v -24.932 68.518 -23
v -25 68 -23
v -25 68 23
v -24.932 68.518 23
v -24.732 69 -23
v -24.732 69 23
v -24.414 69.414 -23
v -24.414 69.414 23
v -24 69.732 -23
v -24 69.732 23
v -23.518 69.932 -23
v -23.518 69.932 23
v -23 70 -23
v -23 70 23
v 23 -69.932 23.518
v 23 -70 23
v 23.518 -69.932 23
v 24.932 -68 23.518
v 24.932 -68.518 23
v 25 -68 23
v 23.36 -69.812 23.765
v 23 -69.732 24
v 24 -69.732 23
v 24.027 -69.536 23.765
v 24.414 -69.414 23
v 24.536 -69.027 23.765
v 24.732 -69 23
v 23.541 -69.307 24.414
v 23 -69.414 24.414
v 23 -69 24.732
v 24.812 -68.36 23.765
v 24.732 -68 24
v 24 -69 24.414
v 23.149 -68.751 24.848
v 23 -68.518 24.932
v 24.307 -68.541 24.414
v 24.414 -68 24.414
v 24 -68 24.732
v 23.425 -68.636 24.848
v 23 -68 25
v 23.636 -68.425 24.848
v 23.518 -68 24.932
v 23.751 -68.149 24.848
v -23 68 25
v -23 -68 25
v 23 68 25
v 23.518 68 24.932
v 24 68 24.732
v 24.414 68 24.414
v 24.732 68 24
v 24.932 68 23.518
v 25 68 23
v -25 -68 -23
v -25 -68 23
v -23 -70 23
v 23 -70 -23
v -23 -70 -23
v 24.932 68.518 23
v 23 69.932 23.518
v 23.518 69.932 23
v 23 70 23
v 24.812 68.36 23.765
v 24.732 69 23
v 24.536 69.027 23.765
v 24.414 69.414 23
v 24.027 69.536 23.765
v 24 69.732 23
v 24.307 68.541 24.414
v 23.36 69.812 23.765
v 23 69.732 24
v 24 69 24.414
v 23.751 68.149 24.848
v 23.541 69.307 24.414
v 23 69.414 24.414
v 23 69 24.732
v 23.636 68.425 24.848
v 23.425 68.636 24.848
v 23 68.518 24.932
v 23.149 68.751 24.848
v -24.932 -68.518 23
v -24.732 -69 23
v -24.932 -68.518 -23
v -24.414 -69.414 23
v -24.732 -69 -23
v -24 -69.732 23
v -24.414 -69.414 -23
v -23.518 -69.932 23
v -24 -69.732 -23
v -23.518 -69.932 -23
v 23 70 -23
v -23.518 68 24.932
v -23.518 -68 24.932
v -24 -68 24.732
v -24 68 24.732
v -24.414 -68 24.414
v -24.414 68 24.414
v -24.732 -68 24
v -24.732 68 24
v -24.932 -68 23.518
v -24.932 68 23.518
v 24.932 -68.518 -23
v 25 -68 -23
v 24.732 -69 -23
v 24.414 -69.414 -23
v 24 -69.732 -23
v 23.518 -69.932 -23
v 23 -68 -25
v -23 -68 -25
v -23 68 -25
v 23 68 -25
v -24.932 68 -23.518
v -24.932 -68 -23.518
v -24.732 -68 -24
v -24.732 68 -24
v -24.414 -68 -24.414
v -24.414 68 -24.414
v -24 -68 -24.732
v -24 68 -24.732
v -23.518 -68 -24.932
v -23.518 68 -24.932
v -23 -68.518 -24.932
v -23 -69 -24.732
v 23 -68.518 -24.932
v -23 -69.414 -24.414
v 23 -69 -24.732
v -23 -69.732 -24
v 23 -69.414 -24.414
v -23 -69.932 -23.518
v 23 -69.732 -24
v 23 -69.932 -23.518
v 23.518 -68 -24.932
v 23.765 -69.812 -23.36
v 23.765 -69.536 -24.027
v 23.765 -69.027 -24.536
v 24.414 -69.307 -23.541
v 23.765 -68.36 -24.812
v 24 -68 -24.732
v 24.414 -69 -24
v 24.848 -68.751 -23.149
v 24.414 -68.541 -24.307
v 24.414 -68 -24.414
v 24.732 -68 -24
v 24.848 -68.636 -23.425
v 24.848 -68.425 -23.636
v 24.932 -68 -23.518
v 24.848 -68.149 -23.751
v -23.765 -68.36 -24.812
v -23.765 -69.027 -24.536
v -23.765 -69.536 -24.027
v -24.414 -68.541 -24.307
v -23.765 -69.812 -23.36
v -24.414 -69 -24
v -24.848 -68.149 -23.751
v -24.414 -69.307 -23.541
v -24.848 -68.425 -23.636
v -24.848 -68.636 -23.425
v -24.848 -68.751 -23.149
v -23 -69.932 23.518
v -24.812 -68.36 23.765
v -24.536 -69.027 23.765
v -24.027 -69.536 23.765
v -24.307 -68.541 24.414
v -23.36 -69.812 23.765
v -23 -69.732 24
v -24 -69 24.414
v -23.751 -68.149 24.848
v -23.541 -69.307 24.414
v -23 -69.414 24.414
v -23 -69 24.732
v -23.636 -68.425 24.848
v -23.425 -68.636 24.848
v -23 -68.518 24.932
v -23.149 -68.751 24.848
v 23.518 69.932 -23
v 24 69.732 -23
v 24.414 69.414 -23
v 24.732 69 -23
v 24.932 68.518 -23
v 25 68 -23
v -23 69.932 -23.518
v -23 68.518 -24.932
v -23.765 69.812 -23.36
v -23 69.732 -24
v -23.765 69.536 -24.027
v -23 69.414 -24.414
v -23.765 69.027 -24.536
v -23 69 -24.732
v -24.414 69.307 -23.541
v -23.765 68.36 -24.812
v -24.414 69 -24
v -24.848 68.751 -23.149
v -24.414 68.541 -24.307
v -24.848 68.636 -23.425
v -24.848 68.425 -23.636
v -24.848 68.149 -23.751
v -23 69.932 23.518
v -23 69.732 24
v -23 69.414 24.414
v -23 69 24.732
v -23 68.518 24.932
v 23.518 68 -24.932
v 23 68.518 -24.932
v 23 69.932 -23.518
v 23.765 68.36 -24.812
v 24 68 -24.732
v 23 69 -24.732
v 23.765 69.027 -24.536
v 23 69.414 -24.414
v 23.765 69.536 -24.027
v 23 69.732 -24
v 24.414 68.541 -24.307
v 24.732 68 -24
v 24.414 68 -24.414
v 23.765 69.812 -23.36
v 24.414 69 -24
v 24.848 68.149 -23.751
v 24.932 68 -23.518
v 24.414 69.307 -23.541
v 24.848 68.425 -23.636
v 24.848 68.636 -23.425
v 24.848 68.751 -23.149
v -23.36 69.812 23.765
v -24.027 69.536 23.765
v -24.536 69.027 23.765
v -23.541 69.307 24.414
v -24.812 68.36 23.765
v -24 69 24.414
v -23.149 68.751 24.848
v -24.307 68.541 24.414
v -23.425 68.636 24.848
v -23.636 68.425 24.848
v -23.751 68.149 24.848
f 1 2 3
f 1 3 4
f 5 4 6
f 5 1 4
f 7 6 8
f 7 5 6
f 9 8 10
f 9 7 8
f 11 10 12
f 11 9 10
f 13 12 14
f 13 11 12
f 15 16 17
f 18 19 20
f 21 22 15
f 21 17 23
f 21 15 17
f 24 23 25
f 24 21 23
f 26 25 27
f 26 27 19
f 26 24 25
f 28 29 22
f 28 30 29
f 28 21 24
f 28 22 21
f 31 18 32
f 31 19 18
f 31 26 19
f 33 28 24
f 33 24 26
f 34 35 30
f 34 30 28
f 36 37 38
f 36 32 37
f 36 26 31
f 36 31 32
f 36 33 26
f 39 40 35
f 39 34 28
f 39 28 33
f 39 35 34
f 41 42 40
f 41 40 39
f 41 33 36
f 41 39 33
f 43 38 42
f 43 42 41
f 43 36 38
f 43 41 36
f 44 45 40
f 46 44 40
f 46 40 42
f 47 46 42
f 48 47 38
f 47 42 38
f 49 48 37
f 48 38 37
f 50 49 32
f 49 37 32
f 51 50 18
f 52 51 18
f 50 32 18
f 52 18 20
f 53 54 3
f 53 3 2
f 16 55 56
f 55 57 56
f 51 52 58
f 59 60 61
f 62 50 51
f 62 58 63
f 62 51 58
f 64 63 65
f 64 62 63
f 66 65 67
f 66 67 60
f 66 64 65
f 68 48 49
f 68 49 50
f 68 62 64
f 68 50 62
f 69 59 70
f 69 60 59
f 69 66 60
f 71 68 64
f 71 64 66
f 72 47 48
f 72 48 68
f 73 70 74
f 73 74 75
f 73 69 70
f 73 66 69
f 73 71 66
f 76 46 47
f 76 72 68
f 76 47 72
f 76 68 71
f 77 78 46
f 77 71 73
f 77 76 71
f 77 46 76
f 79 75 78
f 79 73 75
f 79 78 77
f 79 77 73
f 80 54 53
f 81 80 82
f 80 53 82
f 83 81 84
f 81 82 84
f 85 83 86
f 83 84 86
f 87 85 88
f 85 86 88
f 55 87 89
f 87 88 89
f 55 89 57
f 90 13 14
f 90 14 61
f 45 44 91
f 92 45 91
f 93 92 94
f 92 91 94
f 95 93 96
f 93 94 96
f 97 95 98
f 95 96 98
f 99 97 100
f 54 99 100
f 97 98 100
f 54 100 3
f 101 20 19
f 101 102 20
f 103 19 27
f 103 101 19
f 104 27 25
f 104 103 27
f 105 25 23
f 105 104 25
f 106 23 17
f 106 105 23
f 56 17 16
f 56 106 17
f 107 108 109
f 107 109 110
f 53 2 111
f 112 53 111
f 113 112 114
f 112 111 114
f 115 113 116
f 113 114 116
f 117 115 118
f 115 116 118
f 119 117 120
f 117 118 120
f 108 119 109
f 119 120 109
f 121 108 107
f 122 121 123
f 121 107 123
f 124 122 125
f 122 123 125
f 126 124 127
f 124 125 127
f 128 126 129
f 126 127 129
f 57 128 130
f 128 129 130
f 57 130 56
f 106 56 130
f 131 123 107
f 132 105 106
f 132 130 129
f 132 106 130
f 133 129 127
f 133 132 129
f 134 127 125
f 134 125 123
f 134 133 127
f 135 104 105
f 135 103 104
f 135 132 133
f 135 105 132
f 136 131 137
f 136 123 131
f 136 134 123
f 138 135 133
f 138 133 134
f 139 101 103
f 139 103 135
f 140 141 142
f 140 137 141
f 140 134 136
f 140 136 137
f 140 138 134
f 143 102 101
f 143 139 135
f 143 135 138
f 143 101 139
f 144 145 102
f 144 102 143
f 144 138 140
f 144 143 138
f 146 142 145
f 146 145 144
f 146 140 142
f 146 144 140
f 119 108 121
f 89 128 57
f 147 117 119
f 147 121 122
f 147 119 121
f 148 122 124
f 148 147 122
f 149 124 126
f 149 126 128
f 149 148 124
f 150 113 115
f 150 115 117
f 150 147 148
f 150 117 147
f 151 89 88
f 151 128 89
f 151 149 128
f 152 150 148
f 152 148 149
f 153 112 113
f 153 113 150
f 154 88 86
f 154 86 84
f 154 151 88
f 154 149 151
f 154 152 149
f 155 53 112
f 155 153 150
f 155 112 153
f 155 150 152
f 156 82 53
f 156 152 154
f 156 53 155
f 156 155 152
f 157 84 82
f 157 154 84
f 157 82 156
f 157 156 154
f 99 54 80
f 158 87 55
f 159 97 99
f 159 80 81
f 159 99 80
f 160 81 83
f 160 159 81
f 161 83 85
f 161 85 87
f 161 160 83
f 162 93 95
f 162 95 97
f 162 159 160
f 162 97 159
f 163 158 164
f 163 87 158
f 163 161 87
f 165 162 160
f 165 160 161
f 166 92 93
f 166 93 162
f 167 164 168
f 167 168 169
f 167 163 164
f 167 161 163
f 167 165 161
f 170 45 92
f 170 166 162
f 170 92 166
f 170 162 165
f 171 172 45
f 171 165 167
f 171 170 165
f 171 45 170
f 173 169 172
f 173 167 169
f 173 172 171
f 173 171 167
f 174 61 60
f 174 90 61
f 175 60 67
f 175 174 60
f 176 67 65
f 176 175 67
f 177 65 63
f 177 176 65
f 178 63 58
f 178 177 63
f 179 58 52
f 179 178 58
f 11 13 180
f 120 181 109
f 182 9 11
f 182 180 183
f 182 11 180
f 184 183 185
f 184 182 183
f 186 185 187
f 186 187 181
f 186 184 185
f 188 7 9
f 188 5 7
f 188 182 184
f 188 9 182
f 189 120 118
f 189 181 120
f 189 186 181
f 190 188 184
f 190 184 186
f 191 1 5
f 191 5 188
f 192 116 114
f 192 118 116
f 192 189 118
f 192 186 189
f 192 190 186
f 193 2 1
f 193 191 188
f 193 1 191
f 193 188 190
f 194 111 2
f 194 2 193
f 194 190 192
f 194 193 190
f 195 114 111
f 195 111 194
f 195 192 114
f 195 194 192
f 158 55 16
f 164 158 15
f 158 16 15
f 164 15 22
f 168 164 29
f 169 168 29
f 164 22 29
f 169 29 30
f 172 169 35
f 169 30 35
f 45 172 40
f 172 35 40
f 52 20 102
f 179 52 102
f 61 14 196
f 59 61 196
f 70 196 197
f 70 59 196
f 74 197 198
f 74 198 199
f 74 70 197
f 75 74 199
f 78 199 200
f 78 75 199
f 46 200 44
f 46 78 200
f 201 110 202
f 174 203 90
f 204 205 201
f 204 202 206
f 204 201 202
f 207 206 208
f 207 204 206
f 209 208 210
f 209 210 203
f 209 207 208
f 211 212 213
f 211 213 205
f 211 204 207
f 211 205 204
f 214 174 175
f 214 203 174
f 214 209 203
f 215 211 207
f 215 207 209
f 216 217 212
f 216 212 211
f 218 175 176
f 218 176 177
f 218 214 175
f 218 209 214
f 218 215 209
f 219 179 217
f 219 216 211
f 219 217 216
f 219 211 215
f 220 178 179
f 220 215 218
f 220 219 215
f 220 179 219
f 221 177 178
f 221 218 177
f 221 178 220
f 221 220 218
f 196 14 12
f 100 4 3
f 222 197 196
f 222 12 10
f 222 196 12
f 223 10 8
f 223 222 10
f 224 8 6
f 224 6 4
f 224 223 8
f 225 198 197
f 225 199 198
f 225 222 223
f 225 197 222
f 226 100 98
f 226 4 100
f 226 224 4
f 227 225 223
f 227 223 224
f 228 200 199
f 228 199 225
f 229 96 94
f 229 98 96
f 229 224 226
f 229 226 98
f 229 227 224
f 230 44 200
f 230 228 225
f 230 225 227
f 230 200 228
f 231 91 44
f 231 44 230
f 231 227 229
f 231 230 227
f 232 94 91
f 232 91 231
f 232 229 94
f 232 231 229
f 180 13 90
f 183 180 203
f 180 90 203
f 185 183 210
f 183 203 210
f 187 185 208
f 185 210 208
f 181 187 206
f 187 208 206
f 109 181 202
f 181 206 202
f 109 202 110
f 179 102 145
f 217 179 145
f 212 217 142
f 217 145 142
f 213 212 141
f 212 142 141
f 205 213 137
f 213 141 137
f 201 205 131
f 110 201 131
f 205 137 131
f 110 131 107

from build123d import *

# Parameters (mm, degrees)
SKETCH1_W           = 50
SKETCH1_H           = 50
BOSS_EXTRUDE1_DEPTH = 70
FILLET1_R           = 2
FILLET2_R           = 2


with BuildPart() as part:
    # Sketch1 → Boss-Extrude1 (new, symmetric)
    with BuildSketch(Plane(origin=(0, 0, 0), x_dir=(1, 0, 0), z_dir=(0, 1, 0))):
        Rectangle(SKETCH1_W, SKETCH1_H)
    extrude(amount=BOSS_EXTRUDE1_DEPTH, both=True)

    # Fillet1
    fillet1_edges = [part.edges().sort_by_distance(p)[0] for p in [
        (-25, 70, 0),
        (0, 70, 25),
        (25, 70, 0),
        (0, -70, 25),
        (-25, -70, 0),
        (0, -70, -25),
        (25, -70, 0),
        (0, 70, -25),
    ]]
    fillet(fillet1_edges, radius=FILLET1_R)

    # Fillet2
    # the kernel refuses this fillet: 2 mm, written as the material it takes off along each edge
    with BuildSketch(Plane(origin=(23, -68, 23), x_dir=(1, 0, 0), z_dir=(0, 0, 1))) as fillet2_piece_1_section:
        Polygon((0, 0), (FILLET2_R, 0), (FILLET2_R, -FILLET2_R), (0, -FILLET2_R), align=None)
    fillet2_piece_1 = extrude(amount=FILLET2_R, mode=Mode.PRIVATE)
    fillet2_piece_1 = fillet2_piece_1 - Plane(origin=(23, -68, 23), x_dir=(-0.7071067811865475, 0.7071067811865475, 0), z_dir=(0, 0, 1)) * Sphere(FILLET2_R, mode=Mode.PRIVATE)
    add(fillet2_piece_1, mode=Mode.SUBTRACT)
    with BuildSketch(Plane(origin=(-23, -68, 23), x_dir=(-1, 0, 0), z_dir=(0, 0, 1))) as fillet2_piece_2_section:
        Polygon((0, 0), (FILLET2_R, 0), (FILLET2_R, FILLET2_R), (0, FILLET2_R), align=None)
    fillet2_piece_2 = extrude(amount=FILLET2_R, mode=Mode.PRIVATE)
    fillet2_piece_2 = fillet2_piece_2 - Plane(origin=(-23, -68, 23), x_dir=(0.7071067811865475, 0.7071067811865475, 0), z_dir=(0, 0, 1)) * Sphere(FILLET2_R, mode=Mode.PRIVATE)
    add(fillet2_piece_2, mode=Mode.SUBTRACT)
    with BuildSketch(Plane(origin=(23, -68, -23), x_dir=(0, 0, -1), z_dir=(1, 0, 0))) as fillet2_piece_3_section:
        Polygon((0, 0), (FILLET2_R, 0), (FILLET2_R, -FILLET2_R), (0, -FILLET2_R), align=None)
    fillet2_piece_3 = extrude(amount=FILLET2_R, mode=Mode.PRIVATE)
    fillet2_piece_3 = fillet2_piece_3 - Plane(origin=(23, -68, -23), x_dir=(0, 0.7071067811865475, 0.7071067811865475), z_dir=(1, 0, 0)) * Sphere(FILLET2_R, mode=Mode.PRIVATE)
    add(fillet2_piece_3, mode=Mode.SUBTRACT)
    with BuildSketch(Plane(origin=(-23, -68, -23), x_dir=(0, 0, -1), z_dir=(-1, 0, 0))) as fillet2_piece_4_section:
        Polygon((0, 0), (FILLET2_R, 0), (FILLET2_R, FILLET2_R), (0, FILLET2_R), align=None)
    fillet2_piece_4 = extrude(amount=FILLET2_R, mode=Mode.PRIVATE)
    fillet2_piece_4 = fillet2_piece_4 - Plane(origin=(-23, -68, -23), x_dir=(0, 0.7071067811865475, 0.7071067811865475), z_dir=(-1, 0, 0)) * Sphere(FILLET2_R, mode=Mode.PRIVATE)
    add(fillet2_piece_4, mode=Mode.SUBTRACT)
    with BuildSketch(Plane(origin=(-23, 68, -23), x_dir=(0, 0, -1), z_dir=(-1, 0, 0))) as fillet2_piece_5_section:
        Polygon((0, 0), (FILLET2_R, 0), (FILLET2_R, -FILLET2_R), (0, -FILLET2_R), align=None)
    fillet2_piece_5 = extrude(amount=FILLET2_R, mode=Mode.PRIVATE)
    fillet2_piece_5 = fillet2_piece_5 - Plane(origin=(-23, 68, -23), x_dir=(0, -0.7071067811865475, 0.7071067811865475), z_dir=(-1, 0, 0)) * Sphere(FILLET2_R, mode=Mode.PRIVATE)
    add(fillet2_piece_5, mode=Mode.SUBTRACT)
    with BuildSketch(Plane(origin=(23, 68, -23), x_dir=(0, 0, -1), z_dir=(1, 0, 0))) as fillet2_piece_6_section:
        Polygon((0, 0), (FILLET2_R, 0), (FILLET2_R, FILLET2_R), (0, FILLET2_R), align=None)
    fillet2_piece_6 = extrude(amount=FILLET2_R, mode=Mode.PRIVATE)
    fillet2_piece_6 = fillet2_piece_6 - Plane(origin=(23, 68, -23), x_dir=(0, -0.7071067811865475, 0.7071067811865475), z_dir=(1, 0, 0)) * Sphere(FILLET2_R, mode=Mode.PRIVATE)
    add(fillet2_piece_6, mode=Mode.SUBTRACT)
    with BuildSketch(Plane(origin=(-23, 68, 23), x_dir=(-1, 0, 0), z_dir=(0, 0, 1))) as fillet2_piece_7_section:
        Polygon((0, 0), (FILLET2_R, 0), (FILLET2_R, -FILLET2_R), (0, -FILLET2_R), align=None)
    fillet2_piece_7 = extrude(amount=FILLET2_R, mode=Mode.PRIVATE)
    fillet2_piece_7 = fillet2_piece_7 - Plane(origin=(-23, 68, 23), x_dir=(0.7071067811865475, -0.7071067811865475, 0), z_dir=(0, 0, 1)) * Sphere(FILLET2_R, mode=Mode.PRIVATE)
    add(fillet2_piece_7, mode=Mode.SUBTRACT)
    with BuildSketch(Plane(origin=(23, 68, 23), x_dir=(1, 0, 0), z_dir=(0, 0, 1))) as fillet2_piece_8_section:
        Polygon((0, 0), (FILLET2_R, 0), (FILLET2_R, FILLET2_R), (0, FILLET2_R), align=None)
    fillet2_piece_8 = extrude(amount=FILLET2_R, mode=Mode.PRIVATE)
    fillet2_piece_8 = fillet2_piece_8 - Plane(origin=(23, 68, 23), x_dir=(-0.7071067811865475, -0.7071067811865475, 0), z_dir=(0, 0, 1)) * Sphere(FILLET2_R, mode=Mode.PRIVATE)
    add(fillet2_piece_8, mode=Mode.SUBTRACT)
    with BuildSketch(Plane(origin=(-25, 68, -25), x_dir=(0, 0, 1), z_dir=(0, -1, 0)), Plane(origin=(25, -68, -25), x_dir=(0, 0, 1), z_dir=(0, 1, 0)), Plane(origin=(-25, 68, 25), x_dir=(1, 0, 0), z_dir=(0, -1, 0)), Plane(origin=(25, -68, 25), x_dir=(-1, 0, 0), z_dir=(0, 1, 0))) as fillet2_piece_9:
        with BuildLine():
            CenterArc((FILLET2_R, -FILLET2_R), FILLET2_R, 90, 90)
            Line((0, -FILLET2_R), (0, 0))
            Line((0, 0), (FILLET2_R, 0))
        make_face()
    extrude(amount=136, mode=Mode.SUBTRACT)


solid = part.part
